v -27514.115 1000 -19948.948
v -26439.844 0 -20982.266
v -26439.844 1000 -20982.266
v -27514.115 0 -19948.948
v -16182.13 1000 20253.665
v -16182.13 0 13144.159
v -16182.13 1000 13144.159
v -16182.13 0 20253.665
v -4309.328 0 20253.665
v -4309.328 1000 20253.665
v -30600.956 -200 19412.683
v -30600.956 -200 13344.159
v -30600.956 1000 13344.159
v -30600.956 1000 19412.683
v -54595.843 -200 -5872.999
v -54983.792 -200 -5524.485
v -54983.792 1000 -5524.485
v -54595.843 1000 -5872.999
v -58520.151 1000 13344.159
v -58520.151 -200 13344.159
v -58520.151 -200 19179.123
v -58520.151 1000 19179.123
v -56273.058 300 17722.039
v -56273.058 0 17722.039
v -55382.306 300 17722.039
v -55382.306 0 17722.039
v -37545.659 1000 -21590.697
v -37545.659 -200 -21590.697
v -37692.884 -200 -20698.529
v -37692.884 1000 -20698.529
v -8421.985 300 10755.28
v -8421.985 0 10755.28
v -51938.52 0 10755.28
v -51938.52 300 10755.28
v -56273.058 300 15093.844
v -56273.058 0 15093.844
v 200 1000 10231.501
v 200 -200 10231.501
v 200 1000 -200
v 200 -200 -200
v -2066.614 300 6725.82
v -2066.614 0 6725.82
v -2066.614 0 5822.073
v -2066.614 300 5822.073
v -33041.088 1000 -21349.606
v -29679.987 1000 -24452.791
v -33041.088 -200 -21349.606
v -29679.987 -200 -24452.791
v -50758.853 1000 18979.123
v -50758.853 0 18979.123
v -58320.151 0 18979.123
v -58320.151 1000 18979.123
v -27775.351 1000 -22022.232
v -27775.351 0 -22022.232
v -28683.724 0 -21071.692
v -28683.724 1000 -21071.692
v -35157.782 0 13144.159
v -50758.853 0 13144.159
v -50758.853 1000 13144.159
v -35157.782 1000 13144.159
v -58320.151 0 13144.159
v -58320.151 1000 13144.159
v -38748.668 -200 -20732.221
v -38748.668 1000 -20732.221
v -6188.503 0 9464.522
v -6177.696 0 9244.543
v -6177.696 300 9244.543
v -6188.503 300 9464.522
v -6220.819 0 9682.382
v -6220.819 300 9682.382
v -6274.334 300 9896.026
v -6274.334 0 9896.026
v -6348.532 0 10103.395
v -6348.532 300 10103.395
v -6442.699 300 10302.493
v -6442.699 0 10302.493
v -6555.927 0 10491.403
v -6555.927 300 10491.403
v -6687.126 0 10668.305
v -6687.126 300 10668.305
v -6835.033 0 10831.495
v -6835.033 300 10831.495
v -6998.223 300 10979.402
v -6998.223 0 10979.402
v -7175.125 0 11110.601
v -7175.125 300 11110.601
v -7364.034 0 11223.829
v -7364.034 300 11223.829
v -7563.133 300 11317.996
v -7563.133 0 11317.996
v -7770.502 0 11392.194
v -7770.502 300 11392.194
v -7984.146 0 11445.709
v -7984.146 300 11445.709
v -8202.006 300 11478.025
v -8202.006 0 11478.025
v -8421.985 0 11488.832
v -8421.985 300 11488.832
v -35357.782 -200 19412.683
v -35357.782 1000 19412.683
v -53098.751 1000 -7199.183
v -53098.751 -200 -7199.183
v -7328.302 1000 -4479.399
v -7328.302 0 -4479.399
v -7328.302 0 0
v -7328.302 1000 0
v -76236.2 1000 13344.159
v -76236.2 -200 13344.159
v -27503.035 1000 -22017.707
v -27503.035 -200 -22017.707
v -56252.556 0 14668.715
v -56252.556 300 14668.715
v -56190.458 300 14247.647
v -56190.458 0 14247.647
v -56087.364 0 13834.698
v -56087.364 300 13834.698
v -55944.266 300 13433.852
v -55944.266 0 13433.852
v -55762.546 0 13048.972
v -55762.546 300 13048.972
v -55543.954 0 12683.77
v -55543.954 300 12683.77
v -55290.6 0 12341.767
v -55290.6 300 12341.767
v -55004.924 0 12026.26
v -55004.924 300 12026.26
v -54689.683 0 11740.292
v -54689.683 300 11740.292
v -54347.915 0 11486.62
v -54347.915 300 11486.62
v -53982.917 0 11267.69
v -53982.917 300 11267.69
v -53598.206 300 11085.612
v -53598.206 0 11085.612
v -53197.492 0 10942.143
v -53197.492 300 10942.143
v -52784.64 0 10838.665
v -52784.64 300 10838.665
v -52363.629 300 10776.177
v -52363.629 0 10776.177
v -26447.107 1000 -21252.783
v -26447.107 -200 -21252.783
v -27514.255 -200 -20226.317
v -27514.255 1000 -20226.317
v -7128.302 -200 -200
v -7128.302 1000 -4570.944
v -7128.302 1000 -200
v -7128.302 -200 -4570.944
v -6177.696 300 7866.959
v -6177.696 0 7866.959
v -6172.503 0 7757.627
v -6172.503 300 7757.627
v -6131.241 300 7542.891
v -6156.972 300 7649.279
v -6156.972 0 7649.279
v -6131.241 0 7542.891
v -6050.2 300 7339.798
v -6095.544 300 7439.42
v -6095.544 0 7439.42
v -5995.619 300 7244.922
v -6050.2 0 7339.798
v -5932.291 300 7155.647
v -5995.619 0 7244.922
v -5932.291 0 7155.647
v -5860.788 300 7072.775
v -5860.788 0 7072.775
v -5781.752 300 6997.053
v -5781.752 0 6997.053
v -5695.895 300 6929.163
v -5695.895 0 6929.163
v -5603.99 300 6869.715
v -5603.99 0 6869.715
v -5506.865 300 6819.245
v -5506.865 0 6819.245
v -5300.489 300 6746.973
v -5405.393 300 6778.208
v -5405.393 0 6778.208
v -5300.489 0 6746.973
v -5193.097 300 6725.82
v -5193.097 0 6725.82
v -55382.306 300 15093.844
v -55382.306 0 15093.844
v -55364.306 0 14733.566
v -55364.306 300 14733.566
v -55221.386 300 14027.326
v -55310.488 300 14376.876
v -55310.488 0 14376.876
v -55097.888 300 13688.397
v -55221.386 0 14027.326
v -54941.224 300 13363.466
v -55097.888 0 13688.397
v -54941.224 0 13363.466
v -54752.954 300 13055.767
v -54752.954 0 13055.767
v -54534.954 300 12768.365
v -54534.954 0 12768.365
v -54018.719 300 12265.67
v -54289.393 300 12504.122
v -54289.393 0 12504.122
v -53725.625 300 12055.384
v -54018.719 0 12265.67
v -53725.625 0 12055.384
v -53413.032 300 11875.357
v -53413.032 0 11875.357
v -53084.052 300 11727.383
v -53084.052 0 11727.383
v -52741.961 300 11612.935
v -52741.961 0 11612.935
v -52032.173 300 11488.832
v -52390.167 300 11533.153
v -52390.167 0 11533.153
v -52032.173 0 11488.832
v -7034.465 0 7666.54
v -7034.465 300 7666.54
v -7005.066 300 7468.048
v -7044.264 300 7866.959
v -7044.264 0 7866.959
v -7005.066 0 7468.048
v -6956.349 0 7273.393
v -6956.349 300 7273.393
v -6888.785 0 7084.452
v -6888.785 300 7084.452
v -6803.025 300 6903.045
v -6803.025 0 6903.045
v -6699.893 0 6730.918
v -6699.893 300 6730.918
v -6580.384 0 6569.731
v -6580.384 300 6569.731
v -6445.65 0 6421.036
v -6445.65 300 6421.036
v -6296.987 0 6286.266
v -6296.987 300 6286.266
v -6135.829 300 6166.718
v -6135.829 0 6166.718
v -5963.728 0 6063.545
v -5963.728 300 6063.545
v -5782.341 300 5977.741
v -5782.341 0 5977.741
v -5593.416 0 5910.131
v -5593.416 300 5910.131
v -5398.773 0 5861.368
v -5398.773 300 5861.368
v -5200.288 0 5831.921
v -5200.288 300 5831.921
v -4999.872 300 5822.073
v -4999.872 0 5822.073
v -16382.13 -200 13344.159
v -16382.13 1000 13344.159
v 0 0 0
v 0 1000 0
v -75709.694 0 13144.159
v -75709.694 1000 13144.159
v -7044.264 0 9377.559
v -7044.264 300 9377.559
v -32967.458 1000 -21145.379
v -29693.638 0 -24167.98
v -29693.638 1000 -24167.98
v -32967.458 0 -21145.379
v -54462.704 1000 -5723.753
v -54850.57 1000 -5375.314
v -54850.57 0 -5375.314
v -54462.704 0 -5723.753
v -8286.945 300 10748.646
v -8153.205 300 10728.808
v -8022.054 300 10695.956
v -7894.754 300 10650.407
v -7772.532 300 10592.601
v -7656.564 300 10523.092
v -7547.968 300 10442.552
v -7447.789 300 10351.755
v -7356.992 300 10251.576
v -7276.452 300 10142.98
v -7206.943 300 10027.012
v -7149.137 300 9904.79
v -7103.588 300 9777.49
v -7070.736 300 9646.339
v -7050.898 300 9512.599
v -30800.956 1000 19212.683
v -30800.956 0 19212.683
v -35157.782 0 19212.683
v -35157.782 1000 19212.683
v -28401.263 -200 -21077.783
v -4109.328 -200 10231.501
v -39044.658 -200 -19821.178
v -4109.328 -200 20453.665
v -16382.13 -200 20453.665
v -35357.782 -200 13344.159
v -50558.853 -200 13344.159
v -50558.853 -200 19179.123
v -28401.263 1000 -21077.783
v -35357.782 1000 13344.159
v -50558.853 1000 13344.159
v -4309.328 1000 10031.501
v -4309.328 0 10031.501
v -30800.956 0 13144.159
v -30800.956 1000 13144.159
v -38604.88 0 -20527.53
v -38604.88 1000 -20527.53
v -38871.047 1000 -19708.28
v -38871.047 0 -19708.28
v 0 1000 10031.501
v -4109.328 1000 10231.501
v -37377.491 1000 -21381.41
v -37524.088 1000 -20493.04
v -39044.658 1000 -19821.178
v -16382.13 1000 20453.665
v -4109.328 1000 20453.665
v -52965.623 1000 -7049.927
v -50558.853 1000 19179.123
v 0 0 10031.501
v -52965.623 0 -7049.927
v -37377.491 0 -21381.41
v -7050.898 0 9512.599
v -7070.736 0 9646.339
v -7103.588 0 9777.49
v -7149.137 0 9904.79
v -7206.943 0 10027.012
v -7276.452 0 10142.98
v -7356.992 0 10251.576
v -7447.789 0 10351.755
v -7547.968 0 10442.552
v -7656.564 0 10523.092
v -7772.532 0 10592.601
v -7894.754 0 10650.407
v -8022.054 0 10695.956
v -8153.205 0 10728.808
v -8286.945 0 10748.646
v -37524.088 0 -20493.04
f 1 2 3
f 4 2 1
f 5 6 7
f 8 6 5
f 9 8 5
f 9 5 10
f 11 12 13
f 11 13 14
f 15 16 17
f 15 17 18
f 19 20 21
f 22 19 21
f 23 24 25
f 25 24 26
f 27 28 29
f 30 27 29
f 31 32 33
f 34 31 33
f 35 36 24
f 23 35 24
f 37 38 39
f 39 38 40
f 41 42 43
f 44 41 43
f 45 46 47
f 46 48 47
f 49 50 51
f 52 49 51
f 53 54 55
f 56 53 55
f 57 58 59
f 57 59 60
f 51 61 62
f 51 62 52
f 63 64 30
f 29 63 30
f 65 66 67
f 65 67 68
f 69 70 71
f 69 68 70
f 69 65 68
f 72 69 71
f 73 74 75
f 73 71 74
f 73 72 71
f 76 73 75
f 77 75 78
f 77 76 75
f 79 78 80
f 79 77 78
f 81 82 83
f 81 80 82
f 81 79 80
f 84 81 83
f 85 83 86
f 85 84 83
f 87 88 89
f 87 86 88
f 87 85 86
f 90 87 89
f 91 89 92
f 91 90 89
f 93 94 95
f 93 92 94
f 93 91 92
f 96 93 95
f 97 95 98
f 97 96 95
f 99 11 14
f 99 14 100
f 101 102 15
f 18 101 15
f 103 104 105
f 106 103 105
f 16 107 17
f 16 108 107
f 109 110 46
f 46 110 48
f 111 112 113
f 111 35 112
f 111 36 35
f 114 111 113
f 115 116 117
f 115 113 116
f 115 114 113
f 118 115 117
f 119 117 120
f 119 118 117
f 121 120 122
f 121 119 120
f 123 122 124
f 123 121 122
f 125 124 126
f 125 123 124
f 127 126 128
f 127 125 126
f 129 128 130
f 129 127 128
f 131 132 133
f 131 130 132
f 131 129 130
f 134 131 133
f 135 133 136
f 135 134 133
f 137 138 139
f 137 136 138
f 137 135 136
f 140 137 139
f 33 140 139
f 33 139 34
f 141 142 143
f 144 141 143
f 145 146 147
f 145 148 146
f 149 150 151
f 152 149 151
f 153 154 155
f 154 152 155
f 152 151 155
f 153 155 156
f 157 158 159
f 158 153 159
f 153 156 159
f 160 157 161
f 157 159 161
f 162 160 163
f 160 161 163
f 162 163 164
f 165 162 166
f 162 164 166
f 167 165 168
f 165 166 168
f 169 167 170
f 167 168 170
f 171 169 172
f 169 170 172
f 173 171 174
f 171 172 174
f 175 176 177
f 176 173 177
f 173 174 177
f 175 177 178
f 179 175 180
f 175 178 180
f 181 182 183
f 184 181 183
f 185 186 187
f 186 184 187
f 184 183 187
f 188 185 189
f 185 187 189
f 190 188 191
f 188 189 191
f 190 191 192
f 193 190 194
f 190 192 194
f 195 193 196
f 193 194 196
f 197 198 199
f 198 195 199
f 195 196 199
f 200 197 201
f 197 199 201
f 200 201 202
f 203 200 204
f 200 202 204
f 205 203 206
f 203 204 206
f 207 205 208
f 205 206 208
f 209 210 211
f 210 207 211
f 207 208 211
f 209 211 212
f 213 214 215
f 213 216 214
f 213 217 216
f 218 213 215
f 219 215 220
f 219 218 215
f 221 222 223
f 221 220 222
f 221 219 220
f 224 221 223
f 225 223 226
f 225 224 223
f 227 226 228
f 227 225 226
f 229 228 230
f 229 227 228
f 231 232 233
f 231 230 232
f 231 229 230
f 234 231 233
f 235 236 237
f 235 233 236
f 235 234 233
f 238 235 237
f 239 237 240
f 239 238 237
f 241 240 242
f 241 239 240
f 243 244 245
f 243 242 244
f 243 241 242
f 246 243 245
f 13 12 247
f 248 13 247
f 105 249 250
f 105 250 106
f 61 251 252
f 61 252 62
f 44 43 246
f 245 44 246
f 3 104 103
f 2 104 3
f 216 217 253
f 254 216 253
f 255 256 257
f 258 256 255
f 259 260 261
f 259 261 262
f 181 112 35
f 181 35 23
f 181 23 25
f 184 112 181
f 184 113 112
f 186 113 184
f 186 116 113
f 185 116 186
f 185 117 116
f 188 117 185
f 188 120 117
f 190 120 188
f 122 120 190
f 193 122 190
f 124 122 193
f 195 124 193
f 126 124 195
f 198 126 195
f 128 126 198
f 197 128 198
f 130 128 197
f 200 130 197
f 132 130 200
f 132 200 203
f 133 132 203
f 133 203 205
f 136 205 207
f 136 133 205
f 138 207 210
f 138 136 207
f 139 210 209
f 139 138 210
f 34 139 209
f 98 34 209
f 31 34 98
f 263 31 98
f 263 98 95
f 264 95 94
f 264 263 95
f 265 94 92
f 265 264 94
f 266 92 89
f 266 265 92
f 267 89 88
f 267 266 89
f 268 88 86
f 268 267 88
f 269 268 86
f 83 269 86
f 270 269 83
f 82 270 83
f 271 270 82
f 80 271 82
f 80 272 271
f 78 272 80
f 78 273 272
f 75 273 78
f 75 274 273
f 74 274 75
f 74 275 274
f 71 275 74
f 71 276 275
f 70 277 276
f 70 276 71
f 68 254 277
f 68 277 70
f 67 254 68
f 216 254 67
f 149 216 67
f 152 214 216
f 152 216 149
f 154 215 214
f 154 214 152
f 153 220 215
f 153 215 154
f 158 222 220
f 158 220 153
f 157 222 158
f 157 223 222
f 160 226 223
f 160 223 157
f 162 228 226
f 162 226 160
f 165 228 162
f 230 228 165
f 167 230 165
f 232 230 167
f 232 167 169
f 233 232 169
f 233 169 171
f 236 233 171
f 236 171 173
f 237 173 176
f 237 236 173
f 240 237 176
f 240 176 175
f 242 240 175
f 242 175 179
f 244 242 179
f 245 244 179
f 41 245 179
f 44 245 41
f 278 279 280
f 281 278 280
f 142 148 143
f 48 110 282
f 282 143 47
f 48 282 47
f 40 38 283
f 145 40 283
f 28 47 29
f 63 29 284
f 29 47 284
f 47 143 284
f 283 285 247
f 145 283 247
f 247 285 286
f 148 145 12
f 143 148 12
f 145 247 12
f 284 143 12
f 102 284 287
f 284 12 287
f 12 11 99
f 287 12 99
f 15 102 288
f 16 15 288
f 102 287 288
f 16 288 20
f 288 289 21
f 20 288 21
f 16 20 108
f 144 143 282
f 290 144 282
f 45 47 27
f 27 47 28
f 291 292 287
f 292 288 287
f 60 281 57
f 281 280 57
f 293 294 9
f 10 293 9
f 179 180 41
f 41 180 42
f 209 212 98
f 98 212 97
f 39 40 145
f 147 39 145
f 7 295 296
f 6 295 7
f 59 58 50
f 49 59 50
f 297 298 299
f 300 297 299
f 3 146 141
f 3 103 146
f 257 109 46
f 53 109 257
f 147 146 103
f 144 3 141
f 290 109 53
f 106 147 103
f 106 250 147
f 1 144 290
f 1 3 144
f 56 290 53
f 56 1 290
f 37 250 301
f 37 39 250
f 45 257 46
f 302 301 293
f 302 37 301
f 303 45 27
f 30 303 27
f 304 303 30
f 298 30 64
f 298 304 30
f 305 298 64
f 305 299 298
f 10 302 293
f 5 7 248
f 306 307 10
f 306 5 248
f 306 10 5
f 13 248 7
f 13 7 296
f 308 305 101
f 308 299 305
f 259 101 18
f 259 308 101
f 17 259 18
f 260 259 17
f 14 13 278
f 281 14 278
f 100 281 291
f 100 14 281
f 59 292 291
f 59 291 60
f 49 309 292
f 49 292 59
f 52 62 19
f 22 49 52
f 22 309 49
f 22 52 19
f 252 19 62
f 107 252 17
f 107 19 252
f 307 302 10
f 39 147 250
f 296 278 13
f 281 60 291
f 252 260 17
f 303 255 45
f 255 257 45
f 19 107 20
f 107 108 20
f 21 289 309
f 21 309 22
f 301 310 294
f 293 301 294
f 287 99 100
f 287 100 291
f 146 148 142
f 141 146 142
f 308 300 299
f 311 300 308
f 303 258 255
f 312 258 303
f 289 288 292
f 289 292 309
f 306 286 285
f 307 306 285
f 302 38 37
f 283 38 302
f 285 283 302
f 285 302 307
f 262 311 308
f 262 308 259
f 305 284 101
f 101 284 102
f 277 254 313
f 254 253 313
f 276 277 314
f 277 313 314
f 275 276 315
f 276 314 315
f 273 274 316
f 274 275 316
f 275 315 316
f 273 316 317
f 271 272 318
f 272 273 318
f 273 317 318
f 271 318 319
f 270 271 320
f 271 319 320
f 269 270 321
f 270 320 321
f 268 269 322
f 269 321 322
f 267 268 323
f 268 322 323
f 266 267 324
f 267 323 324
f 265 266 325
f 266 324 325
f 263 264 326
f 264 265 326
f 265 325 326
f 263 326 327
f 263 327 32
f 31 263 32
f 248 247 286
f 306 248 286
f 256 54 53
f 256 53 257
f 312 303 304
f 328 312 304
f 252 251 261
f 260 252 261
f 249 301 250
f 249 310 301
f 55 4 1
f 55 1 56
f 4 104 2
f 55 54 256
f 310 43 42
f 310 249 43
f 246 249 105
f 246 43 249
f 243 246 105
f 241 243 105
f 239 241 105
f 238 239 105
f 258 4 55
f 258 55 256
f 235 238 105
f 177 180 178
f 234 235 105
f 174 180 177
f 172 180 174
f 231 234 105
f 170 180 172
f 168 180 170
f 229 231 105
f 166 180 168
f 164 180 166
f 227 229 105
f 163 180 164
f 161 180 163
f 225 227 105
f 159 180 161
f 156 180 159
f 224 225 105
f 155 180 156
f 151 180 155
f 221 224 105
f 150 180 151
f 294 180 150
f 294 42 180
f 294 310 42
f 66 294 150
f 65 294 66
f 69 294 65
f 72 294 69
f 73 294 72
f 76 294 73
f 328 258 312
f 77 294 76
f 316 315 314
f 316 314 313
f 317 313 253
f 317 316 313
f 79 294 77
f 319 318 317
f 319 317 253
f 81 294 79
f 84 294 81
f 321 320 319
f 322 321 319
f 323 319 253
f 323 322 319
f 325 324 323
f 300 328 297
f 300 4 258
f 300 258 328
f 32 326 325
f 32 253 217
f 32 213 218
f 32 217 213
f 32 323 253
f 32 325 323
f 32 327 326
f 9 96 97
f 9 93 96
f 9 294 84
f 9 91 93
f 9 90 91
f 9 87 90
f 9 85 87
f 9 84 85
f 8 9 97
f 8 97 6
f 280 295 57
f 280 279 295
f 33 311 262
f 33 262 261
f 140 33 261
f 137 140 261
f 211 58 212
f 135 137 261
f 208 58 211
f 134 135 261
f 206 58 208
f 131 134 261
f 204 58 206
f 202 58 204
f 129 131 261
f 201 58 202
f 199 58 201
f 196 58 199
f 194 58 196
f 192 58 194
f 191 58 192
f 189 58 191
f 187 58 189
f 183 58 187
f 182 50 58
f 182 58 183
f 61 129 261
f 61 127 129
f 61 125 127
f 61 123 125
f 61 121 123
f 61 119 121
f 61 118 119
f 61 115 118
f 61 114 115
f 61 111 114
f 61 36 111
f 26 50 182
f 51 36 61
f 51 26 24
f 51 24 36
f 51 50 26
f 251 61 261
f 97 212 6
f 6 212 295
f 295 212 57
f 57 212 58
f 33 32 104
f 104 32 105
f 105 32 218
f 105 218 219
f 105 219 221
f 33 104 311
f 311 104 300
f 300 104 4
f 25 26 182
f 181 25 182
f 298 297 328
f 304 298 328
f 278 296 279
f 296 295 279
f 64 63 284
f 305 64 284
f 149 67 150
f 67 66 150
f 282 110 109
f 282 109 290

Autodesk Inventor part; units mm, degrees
ref_plane "YZ Plane" through (0, 0, 0) normal (1, 0, 0) x (0, 1, 0)
ref_plane "XZ Plane" through (0, 0, 0) normal (0, 1, 0) x (-1, 0, 0)
ref_plane "XY Plane" through (0, 0, 0) normal (0, 0, 1) x (1, 0, 0)
sketch "Sketch3" plane through (0, 0, 0) normal (0, 1, 0) x (-1, 0, 0)
  line L0 (0, 10031.5014) -> (4309.3277, 10031.5014)
  line L1 (4309.3277, 10031.5014) -> (4309.3277, 20253.6648)
  line L2 (16182.1297, 20253.6648) -> (4309.3277, 20253.6648)
  line L3 (16182.1297, 13144.1594) -> (16182.1297, 20253.6648)
  line L4 (0, 10031.5014) -> (0, 0)
  line L5 (0, 0) -> (7328.3017, 0)
  line L6 (7328.3017, -4479.3991) -> (7328.3017, 0)
  line L7 (7328.3017, -4479.3991) -> (26439.8438, -20982.2659)
  line L8 (26439.8438, -20982.2659) -> (27514.1147, -19948.948)
  line L9 (27514.1147, -19948.948) -> (28683.7243, -21071.6922)
  line L10 (27775.3508, -22022.2319) -> (28683.7243, -21071.6922)
  line L11 (27775.3508, -22022.2319) -> (29693.6379, -24167.9805)
  line L12 (29693.6379, -24167.9805) -> (32967.4576, -21145.3793)
  line L13 (32967.4576, -21145.3793) -> (37377.4906, -21381.4102)
  line L14 (37377.4906, -21381.4102) -> (37524.0883, -20493.0402)
  line L15 (38604.8798, -20527.5304) -> (37524.0883, -20493.0402)
  line L16 (38604.8798, -20527.5304) -> (38871.047, -19708.2796)
  line L17 (38871.047, -19708.2796) -> (39143.6329, -19289.1159)
  line L18 (39143.6329, -19289.1159) -> (52592.2756, -7382.5123)
  line L19 (38871.047, -19708.2796) -> (52965.6227, -7049.9272)
  line L20 (52965.6227, -7049.9272) -> (54462.7042, -5723.7531)
  line L21 (54850.5695, -5375.3135) -> (54462.7042, -5723.7531)
  line L22 (75709.6936, 13144.1594) -> (54850.5695, -5375.3135)
  line L23 (75709.6936, 13144.1594) -> (58320.151, 13144.1594)
  line L24 (58320.151, 13144.1594) -> (58320.151, 18979.1233)
  line L25 (50758.8526, 18979.1233) -> (58320.151, 18979.1233)
  line L26 (50758.8526, 13144.1594) -> (50758.8526, 18979.1233)
  line L27 (50758.8526, 13144.1594) -> (35157.7821, 13144.1594)
  line L28 (35157.7821, 19212.683) -> (35157.7821, 13144.1594)
  line L29 (30800.956, 19212.683) -> (35157.7821, 19212.683)
  line L30 (30800.956, 13144.1594) -> (30800.956, 19212.683)
  line L31 (30800.956, 13144.1594) -> (16182.1297, 13144.1594)
  dimension "d0" = 10031.5014
  dimension "d1" = 4309.3277
  dimension "d2" = 7328.3017
  dimension "d3" = 10222.1634
  dimension "d4" = 11872.802
  dimension "d5" = 7109.5054
  dimension "d6" = 14618.8263
  dimension "d7" = 15601.0705
  dimension "d8" = 6068.5236
  dimension "d9" = 6068.5236
  dimension "d10" = 4356.826
  dimension "d11" = 5834.964
  dimension "d12" = 7561.2984
  dimension "d13" = 17389.5426
extrude "Extrusion1" add sketch "Sketch3" along normal blind 1000
shell "Shell1" thickness 200 outward yes removed faces 1 at (-21881.1241, 1000, -3761.3959)
sketch "Sketch4" plane through (-75709.6936, 0, 13144.1594) normal (0, 1, 0) x (1, 0, 0)
  line L0 (73643.0799, 7322.0862) -> (70709.8218, 7322.0862)
  arc A0 (70709.8218, 7322.0862) -> (68665.4298, 5277.2004) centre (70709.8218, 5277.6942) ccw
  line L1 (68665.4298, 5277.2004) -> (68665.4298, 3766.6003)
  arc A1 (67287.7087, 2388.8792) -> (68665.4298, 3766.6003) centre (67287.7087, 3766.6003) ccw
  line L2 (67287.7087, 2388.8792) -> (23771.1738, 2388.8792)
  arc A2 (23771.1738, 2388.8792) -> (19436.6359, -1949.6842) centre (23771.1738, -1945.6605) ccw
  line L3 (19436.6359, -1949.6842) -> (19436.6359, -4577.8792)
  line L4 (19436.6359, -4577.8792) -> (20327.3881, -4577.8792)
  line L5 (20327.3881, -4577.8792) -> (20327.3881, -1949.6842)
  arc A3 (23677.5205, 1655.3274) -> (20327.3881, -1949.6842) centre (23942.0953, -1949.6842) ccw
  line L6 (23677.5205, 1655.3274) -> (67287.7087, 1655.3274)
  arc A4 (67287.7087, 1655.3274) -> (69531.9829, 3907.8226) centre (67287.7087, 3899.6166) ccw
  line L7 (69531.9979, 3899.6166) -> (69531.9979, 5277.2004)
  arc A5 (70607.9309, 6428.1667) -> (69531.9979, 5277.2004) centre (70685.5804, 5277.2004) ccw
  line L8 (70516.5965, 6418.339) -> (73643.0799, 6418.339)
  line L9 (73643.0799, 6418.339) -> (73643.0799, 7322.0862)
  point P0 (75709.6936, 13144.1594)
extrude "Extrusion2" add sketch "Sketch4" along normal blind 300
properties part number "CIT-2"
